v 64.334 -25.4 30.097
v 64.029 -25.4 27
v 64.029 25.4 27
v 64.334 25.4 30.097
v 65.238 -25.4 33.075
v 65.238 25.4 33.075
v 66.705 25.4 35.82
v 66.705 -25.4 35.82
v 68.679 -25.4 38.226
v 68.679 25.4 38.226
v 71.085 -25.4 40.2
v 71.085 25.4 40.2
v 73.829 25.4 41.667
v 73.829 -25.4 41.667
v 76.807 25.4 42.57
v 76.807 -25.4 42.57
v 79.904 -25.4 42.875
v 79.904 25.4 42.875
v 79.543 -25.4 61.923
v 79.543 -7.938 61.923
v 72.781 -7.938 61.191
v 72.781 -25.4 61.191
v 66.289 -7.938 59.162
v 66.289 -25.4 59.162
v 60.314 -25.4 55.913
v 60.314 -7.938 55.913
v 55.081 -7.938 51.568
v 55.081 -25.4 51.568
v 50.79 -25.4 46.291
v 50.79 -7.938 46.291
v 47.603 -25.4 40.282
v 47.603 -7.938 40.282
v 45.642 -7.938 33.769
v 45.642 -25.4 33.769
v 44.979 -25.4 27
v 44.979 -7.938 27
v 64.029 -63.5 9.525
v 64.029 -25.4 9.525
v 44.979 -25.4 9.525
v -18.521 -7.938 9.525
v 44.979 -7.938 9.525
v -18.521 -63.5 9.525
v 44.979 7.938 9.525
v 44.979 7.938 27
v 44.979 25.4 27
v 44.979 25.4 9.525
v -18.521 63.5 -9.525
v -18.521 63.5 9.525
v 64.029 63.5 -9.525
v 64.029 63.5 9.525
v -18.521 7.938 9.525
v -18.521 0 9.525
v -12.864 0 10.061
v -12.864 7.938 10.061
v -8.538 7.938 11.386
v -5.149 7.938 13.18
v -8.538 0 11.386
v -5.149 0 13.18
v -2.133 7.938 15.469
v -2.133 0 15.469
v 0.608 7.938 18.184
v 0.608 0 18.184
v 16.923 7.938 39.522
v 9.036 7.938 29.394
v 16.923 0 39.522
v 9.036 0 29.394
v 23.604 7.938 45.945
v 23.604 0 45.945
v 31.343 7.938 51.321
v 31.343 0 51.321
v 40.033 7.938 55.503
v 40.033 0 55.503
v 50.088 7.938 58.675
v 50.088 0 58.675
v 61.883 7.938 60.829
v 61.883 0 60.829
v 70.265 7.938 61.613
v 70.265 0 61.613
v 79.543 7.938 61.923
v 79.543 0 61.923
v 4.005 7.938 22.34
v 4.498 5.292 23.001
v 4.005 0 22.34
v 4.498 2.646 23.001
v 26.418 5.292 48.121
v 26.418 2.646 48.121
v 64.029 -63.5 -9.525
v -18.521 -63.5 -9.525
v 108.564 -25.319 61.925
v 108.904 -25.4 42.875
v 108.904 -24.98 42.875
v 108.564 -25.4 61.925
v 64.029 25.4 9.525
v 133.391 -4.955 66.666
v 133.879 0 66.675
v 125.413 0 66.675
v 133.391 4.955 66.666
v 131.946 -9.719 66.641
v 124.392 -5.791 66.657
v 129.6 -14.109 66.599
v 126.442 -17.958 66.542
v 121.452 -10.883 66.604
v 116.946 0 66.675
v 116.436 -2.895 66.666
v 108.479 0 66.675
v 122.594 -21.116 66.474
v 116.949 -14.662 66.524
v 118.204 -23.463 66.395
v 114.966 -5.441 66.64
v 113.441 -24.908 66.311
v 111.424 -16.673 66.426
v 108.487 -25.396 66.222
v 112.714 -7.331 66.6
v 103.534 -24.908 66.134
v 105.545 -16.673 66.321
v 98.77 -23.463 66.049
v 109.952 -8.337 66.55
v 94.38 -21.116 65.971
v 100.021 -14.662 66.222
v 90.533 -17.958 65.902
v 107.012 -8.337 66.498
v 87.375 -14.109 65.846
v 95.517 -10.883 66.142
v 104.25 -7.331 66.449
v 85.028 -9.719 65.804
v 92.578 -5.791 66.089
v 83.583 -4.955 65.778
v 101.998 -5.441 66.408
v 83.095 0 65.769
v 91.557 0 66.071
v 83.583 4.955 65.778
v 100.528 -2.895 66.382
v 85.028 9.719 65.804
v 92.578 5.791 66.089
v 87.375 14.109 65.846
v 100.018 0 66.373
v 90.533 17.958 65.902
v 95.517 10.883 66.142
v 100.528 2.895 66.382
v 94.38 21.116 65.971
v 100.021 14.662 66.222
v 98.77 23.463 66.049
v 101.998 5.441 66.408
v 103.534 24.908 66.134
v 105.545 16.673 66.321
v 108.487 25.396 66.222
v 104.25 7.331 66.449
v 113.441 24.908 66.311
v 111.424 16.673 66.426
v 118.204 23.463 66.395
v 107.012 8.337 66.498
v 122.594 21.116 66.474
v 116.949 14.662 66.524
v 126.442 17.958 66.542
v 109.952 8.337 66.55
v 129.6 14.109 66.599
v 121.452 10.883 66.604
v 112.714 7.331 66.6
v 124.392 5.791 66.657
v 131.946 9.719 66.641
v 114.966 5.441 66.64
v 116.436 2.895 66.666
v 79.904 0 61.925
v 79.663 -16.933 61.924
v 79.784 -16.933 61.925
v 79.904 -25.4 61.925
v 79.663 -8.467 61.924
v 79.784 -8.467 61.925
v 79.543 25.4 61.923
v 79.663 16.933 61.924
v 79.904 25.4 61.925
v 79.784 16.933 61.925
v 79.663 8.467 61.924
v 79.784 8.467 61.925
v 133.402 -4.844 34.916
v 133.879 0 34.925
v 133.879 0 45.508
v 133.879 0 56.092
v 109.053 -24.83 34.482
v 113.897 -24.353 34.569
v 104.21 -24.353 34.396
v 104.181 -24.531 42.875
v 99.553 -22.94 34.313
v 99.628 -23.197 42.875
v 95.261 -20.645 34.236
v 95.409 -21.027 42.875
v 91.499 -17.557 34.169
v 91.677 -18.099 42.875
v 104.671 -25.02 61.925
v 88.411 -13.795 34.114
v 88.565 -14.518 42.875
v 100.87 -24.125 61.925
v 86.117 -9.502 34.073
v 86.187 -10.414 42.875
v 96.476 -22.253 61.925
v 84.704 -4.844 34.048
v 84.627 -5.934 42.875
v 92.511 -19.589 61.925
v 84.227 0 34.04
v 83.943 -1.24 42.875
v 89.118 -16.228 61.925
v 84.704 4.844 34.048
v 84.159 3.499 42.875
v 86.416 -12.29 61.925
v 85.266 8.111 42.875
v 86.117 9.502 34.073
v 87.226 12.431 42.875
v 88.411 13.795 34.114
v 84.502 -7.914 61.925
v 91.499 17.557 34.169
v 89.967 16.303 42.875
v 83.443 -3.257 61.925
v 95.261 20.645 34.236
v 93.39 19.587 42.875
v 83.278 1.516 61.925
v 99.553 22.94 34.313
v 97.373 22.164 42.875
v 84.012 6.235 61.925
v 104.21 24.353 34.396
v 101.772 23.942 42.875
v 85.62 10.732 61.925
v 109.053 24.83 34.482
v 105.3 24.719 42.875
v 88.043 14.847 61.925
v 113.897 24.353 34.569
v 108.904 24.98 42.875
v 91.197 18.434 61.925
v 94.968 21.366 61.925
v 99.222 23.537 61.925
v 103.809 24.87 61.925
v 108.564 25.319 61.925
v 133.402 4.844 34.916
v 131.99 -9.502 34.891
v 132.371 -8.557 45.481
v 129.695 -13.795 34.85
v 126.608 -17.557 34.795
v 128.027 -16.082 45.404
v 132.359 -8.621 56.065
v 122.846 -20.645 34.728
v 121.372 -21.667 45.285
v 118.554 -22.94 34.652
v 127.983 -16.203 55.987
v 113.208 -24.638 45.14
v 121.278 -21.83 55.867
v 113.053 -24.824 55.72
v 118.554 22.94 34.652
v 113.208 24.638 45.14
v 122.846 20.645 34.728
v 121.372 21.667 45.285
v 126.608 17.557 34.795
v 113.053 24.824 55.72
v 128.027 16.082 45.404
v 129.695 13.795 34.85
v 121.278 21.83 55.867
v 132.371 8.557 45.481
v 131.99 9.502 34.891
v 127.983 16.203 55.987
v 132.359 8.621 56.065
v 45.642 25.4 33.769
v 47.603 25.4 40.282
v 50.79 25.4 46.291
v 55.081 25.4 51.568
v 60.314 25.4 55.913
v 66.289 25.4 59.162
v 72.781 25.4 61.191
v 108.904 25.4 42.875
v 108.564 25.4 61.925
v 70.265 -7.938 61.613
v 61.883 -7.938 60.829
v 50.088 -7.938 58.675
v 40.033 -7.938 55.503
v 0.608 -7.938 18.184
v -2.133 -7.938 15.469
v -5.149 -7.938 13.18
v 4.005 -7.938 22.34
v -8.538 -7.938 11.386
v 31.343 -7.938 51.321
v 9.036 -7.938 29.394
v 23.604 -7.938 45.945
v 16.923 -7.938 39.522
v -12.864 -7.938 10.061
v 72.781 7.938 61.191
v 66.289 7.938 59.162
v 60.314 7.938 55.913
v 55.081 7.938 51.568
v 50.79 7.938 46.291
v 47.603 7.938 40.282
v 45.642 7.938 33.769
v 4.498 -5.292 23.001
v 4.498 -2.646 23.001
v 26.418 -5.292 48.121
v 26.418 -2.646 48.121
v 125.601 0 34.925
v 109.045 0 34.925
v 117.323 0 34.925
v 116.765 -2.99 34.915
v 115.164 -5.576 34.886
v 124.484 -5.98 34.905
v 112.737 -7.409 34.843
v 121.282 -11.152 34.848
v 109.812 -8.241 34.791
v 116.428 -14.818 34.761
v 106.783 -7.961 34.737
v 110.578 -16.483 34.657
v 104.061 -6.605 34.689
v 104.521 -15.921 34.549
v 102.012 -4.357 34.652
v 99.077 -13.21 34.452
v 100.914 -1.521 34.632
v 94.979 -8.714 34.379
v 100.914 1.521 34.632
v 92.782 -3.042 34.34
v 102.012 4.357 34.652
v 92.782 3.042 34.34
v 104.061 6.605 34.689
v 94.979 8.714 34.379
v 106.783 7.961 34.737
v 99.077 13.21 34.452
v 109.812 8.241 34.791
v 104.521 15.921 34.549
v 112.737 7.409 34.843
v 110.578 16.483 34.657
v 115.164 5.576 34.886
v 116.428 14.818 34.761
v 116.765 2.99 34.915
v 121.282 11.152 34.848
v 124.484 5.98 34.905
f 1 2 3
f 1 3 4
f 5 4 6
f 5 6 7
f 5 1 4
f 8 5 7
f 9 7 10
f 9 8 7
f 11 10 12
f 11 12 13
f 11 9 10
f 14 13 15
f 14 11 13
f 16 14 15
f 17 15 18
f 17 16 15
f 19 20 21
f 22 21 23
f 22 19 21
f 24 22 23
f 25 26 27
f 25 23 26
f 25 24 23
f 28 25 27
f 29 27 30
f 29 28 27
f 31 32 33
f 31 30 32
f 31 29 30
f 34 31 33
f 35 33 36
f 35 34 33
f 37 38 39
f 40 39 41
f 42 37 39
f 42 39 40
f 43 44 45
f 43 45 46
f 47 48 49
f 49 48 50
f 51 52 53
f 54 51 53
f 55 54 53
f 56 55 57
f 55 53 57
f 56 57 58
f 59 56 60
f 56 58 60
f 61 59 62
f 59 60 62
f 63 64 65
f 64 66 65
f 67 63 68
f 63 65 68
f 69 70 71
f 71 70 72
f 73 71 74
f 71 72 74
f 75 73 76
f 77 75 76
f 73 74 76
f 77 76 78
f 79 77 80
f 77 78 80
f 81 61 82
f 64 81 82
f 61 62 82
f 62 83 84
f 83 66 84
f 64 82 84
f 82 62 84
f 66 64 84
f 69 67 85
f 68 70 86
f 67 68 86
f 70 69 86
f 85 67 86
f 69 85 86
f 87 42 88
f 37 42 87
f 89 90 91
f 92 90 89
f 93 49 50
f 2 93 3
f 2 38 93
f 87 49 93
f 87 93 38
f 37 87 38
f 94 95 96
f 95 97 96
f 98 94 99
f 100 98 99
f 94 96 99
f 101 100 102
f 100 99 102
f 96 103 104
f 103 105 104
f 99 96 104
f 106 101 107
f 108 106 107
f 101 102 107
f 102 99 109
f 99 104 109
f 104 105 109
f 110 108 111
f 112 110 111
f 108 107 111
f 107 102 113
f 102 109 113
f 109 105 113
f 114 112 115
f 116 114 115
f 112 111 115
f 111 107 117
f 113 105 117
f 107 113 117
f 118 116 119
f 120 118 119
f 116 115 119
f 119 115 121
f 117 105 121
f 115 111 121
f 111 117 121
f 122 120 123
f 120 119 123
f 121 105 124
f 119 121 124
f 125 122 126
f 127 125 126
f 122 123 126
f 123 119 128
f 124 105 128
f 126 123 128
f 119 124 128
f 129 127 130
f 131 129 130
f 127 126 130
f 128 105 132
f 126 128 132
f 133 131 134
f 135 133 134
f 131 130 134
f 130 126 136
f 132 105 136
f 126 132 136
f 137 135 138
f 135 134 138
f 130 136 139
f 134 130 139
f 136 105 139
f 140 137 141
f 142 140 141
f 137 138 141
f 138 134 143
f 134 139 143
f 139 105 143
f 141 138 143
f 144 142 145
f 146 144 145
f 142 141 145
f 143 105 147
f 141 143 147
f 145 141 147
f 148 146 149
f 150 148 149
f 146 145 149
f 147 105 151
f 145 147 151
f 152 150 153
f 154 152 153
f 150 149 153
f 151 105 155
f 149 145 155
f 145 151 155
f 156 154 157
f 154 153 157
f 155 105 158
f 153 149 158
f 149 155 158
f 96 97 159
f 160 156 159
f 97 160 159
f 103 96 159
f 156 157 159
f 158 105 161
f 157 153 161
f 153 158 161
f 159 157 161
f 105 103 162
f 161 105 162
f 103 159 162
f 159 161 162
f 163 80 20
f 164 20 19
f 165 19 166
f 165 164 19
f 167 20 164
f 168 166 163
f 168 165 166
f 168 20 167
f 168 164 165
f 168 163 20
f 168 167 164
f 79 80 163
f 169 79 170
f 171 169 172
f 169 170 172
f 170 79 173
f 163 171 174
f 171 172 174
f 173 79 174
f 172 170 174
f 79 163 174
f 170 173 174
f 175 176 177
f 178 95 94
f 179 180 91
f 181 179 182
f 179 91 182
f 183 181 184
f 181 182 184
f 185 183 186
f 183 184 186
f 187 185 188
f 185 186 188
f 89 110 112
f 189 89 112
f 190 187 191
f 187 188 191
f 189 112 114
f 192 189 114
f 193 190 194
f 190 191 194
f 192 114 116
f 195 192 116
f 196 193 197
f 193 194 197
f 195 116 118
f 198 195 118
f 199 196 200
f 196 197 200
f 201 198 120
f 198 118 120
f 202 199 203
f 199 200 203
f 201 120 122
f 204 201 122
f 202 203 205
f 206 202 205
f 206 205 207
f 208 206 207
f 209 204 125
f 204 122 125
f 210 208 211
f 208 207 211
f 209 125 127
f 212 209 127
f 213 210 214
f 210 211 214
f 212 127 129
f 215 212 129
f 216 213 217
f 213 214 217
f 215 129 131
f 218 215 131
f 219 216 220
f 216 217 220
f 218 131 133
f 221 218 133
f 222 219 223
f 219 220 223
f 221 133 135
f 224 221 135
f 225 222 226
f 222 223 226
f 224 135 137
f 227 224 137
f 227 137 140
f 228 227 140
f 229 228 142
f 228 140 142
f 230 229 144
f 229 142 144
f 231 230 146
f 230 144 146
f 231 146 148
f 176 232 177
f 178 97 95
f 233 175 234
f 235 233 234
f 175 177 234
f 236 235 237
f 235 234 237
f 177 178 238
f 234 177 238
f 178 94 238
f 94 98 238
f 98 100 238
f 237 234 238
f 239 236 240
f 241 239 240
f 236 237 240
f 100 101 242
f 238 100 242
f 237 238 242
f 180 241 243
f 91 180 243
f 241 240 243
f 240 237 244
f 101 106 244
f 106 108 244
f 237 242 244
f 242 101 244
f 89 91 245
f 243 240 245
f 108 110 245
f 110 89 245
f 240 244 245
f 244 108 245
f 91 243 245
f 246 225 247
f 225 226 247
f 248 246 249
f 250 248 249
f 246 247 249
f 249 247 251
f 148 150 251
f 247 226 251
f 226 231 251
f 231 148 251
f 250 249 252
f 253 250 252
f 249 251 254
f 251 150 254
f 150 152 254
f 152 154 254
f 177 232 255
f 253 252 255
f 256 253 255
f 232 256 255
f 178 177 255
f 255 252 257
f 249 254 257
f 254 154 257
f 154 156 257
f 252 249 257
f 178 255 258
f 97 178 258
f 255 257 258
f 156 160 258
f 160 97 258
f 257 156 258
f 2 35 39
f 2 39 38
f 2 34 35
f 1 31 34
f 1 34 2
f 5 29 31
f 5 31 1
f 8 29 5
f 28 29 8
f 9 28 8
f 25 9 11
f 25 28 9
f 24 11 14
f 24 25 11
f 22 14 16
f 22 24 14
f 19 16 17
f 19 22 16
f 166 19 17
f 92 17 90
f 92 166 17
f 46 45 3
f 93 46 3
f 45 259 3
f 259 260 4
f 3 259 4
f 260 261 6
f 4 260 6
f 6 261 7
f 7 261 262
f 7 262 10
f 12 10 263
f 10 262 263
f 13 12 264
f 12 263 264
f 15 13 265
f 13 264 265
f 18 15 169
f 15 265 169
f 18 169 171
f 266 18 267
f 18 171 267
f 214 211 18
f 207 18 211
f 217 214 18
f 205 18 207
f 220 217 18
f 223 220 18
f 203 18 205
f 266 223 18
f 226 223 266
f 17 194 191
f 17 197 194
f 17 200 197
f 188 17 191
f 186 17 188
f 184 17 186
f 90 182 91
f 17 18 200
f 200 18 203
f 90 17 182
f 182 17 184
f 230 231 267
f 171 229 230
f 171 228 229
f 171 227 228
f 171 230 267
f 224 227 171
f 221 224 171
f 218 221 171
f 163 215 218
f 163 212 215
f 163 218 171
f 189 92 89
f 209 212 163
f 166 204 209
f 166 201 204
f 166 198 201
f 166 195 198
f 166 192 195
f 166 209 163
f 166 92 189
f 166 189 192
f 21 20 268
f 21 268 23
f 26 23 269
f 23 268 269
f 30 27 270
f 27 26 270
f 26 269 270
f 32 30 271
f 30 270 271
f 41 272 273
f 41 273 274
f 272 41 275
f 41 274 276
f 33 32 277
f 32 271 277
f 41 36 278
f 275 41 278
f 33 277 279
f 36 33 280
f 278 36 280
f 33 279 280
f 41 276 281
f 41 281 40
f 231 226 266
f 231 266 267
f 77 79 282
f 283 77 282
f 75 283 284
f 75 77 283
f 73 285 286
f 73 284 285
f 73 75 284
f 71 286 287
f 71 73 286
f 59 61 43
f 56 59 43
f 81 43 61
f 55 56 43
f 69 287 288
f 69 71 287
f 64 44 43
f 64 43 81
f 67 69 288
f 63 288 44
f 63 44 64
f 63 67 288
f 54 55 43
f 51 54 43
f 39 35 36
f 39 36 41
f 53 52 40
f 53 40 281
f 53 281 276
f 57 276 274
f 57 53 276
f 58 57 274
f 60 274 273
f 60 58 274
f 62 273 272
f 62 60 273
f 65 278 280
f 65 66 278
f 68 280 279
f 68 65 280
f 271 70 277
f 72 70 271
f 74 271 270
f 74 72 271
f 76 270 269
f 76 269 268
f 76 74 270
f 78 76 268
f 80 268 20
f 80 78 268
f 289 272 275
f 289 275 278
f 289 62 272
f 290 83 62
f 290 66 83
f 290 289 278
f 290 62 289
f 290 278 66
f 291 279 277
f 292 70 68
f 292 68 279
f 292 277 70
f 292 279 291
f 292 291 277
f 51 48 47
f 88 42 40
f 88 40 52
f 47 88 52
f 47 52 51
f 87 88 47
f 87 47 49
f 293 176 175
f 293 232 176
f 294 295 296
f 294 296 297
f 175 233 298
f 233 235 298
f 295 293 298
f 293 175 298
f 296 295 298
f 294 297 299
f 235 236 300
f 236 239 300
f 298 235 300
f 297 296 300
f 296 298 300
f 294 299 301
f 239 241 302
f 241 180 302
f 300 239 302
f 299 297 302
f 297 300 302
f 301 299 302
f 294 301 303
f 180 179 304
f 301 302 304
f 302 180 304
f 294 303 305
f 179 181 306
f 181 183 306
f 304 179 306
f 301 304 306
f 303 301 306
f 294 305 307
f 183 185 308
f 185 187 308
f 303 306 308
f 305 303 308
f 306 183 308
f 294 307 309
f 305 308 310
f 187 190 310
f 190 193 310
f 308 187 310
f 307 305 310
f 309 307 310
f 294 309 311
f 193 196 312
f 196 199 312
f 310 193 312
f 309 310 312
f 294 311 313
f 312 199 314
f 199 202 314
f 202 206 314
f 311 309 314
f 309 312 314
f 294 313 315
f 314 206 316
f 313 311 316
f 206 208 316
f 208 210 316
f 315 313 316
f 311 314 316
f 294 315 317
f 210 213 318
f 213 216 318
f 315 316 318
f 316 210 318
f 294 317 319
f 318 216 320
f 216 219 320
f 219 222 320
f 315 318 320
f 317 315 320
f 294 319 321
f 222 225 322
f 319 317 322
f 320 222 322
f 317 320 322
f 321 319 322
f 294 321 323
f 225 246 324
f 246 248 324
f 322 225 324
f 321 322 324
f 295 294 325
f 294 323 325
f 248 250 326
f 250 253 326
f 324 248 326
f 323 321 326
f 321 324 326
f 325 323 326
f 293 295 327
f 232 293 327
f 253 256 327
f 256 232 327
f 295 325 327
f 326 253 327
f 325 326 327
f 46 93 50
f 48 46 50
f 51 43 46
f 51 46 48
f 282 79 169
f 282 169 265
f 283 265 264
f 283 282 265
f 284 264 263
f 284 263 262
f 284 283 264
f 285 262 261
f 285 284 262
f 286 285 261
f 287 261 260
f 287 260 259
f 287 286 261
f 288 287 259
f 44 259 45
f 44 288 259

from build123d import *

# Parameters (mm, degrees)
F1_DEPTH = 63.5
F2_DEPTH = 25.4
F3_DEPTH = 7.9375


with BuildPart() as f1:
    # F0 (on Front) → F1 (new body, symmetric)
    with BuildSketch(Plane.XZ):
        Polygon((44.9793039322, 9.525), (-18.5206960678, 9.525), (-18.5206960678, -9.525), (64.0293039322, -9.525), (64.0293039322, 9.525), align=None)
    extrude(amount=F1_DEPTH, both=True)

    # F0 (on Front) → F2 (join, symmetric)
    with BuildSketch(Plane.XZ):
        with BuildLine():
            Line((44.9793039322, 27.0002), (44.9793039322, 9.525))
            Line((44.9793039322, 9.525), (64.0293039322, 9.525))
            Line((64.0293039322, 9.525), (64.0293039322, 27.0002))
            ThreePointArc((64.0293039322, 27.0002), (68.6789837809, 38.2255201513), (79.9043039322, 42.8752))
            Line((79.9043039322, 42.8752), (83.0793039322, 42.8752))
            Line((83.0793039322, 42.8752), (83.0793039322, 61.9252))
            Line((83.0793039322, 61.9252), (79.9043039322, 61.9252))
            add(Edge.make_bspline(
                [(79.5426989751, 61.9233279649), (79.6630155752, 61.9240698804), (79.7835503929, 61.9246940115), (79.9043039322, 61.9252)],
                knots=[111.336027501, 111.336027501, 111.336027501, 111.336027501, 111.5045361635, 111.5045361635, 111.5045361635, 111.5045361635], degree=3))
            ThreePointArc((79.5426989751, 61.9233279649), (55.0810821618, 51.5677250267), (44.9793039322, 27.0002))
        make_face()
        Polygon((108.5640043465, 61.9252), (83.0793039322, 61.9252), (83.0793039322, 42.8752), (108.9037118903, 42.8752), align=None)
    extrude(amount=F2_DEPTH, both=True)

    # F0 (on Front) → F3 (join, symmetric)
    with BuildSketch(Plane.XZ):
        with BuildLine():
            add(Edge.make_bspline(
                [(-18.5206960678, 9.525), (15.8143353949, 9.525), (0.0478403981, 61.4331340424), (79.5426989751, 61.9233279649)],
                knots=[0, 0, 0, 0, 111.336027501, 111.336027501, 111.336027501, 111.336027501], degree=3))
            Line((-18.5206960678, 9.525), (44.9793039322, 9.525))
            Line((44.9793039322, 9.525), (44.9793039322, 27.0002))
            ThreePointArc((44.9793039322, 27.0002), (55.0810821618, 51.5677250267), (79.5426989751, 61.9233279649))
        make_face()
    extrude(amount=F3_DEPTH, both=True)

    # F0 (on Front) → F4 (revolve)
    with BuildSketch(Plane.XZ):
        Polygon((108.4793039322, 66.675), (108.5640043465, 61.9252), (108.9037118903, 42.8752), (109.0454831719, 34.925), (133.8793039322, 34.925), (133.8793039322, 66.675), align=None)
    revolve(axis=Axis((108.7623935521, 0, 50.8), (0.0178295824, 0, -0.9998410404)))


solid = f1.part
